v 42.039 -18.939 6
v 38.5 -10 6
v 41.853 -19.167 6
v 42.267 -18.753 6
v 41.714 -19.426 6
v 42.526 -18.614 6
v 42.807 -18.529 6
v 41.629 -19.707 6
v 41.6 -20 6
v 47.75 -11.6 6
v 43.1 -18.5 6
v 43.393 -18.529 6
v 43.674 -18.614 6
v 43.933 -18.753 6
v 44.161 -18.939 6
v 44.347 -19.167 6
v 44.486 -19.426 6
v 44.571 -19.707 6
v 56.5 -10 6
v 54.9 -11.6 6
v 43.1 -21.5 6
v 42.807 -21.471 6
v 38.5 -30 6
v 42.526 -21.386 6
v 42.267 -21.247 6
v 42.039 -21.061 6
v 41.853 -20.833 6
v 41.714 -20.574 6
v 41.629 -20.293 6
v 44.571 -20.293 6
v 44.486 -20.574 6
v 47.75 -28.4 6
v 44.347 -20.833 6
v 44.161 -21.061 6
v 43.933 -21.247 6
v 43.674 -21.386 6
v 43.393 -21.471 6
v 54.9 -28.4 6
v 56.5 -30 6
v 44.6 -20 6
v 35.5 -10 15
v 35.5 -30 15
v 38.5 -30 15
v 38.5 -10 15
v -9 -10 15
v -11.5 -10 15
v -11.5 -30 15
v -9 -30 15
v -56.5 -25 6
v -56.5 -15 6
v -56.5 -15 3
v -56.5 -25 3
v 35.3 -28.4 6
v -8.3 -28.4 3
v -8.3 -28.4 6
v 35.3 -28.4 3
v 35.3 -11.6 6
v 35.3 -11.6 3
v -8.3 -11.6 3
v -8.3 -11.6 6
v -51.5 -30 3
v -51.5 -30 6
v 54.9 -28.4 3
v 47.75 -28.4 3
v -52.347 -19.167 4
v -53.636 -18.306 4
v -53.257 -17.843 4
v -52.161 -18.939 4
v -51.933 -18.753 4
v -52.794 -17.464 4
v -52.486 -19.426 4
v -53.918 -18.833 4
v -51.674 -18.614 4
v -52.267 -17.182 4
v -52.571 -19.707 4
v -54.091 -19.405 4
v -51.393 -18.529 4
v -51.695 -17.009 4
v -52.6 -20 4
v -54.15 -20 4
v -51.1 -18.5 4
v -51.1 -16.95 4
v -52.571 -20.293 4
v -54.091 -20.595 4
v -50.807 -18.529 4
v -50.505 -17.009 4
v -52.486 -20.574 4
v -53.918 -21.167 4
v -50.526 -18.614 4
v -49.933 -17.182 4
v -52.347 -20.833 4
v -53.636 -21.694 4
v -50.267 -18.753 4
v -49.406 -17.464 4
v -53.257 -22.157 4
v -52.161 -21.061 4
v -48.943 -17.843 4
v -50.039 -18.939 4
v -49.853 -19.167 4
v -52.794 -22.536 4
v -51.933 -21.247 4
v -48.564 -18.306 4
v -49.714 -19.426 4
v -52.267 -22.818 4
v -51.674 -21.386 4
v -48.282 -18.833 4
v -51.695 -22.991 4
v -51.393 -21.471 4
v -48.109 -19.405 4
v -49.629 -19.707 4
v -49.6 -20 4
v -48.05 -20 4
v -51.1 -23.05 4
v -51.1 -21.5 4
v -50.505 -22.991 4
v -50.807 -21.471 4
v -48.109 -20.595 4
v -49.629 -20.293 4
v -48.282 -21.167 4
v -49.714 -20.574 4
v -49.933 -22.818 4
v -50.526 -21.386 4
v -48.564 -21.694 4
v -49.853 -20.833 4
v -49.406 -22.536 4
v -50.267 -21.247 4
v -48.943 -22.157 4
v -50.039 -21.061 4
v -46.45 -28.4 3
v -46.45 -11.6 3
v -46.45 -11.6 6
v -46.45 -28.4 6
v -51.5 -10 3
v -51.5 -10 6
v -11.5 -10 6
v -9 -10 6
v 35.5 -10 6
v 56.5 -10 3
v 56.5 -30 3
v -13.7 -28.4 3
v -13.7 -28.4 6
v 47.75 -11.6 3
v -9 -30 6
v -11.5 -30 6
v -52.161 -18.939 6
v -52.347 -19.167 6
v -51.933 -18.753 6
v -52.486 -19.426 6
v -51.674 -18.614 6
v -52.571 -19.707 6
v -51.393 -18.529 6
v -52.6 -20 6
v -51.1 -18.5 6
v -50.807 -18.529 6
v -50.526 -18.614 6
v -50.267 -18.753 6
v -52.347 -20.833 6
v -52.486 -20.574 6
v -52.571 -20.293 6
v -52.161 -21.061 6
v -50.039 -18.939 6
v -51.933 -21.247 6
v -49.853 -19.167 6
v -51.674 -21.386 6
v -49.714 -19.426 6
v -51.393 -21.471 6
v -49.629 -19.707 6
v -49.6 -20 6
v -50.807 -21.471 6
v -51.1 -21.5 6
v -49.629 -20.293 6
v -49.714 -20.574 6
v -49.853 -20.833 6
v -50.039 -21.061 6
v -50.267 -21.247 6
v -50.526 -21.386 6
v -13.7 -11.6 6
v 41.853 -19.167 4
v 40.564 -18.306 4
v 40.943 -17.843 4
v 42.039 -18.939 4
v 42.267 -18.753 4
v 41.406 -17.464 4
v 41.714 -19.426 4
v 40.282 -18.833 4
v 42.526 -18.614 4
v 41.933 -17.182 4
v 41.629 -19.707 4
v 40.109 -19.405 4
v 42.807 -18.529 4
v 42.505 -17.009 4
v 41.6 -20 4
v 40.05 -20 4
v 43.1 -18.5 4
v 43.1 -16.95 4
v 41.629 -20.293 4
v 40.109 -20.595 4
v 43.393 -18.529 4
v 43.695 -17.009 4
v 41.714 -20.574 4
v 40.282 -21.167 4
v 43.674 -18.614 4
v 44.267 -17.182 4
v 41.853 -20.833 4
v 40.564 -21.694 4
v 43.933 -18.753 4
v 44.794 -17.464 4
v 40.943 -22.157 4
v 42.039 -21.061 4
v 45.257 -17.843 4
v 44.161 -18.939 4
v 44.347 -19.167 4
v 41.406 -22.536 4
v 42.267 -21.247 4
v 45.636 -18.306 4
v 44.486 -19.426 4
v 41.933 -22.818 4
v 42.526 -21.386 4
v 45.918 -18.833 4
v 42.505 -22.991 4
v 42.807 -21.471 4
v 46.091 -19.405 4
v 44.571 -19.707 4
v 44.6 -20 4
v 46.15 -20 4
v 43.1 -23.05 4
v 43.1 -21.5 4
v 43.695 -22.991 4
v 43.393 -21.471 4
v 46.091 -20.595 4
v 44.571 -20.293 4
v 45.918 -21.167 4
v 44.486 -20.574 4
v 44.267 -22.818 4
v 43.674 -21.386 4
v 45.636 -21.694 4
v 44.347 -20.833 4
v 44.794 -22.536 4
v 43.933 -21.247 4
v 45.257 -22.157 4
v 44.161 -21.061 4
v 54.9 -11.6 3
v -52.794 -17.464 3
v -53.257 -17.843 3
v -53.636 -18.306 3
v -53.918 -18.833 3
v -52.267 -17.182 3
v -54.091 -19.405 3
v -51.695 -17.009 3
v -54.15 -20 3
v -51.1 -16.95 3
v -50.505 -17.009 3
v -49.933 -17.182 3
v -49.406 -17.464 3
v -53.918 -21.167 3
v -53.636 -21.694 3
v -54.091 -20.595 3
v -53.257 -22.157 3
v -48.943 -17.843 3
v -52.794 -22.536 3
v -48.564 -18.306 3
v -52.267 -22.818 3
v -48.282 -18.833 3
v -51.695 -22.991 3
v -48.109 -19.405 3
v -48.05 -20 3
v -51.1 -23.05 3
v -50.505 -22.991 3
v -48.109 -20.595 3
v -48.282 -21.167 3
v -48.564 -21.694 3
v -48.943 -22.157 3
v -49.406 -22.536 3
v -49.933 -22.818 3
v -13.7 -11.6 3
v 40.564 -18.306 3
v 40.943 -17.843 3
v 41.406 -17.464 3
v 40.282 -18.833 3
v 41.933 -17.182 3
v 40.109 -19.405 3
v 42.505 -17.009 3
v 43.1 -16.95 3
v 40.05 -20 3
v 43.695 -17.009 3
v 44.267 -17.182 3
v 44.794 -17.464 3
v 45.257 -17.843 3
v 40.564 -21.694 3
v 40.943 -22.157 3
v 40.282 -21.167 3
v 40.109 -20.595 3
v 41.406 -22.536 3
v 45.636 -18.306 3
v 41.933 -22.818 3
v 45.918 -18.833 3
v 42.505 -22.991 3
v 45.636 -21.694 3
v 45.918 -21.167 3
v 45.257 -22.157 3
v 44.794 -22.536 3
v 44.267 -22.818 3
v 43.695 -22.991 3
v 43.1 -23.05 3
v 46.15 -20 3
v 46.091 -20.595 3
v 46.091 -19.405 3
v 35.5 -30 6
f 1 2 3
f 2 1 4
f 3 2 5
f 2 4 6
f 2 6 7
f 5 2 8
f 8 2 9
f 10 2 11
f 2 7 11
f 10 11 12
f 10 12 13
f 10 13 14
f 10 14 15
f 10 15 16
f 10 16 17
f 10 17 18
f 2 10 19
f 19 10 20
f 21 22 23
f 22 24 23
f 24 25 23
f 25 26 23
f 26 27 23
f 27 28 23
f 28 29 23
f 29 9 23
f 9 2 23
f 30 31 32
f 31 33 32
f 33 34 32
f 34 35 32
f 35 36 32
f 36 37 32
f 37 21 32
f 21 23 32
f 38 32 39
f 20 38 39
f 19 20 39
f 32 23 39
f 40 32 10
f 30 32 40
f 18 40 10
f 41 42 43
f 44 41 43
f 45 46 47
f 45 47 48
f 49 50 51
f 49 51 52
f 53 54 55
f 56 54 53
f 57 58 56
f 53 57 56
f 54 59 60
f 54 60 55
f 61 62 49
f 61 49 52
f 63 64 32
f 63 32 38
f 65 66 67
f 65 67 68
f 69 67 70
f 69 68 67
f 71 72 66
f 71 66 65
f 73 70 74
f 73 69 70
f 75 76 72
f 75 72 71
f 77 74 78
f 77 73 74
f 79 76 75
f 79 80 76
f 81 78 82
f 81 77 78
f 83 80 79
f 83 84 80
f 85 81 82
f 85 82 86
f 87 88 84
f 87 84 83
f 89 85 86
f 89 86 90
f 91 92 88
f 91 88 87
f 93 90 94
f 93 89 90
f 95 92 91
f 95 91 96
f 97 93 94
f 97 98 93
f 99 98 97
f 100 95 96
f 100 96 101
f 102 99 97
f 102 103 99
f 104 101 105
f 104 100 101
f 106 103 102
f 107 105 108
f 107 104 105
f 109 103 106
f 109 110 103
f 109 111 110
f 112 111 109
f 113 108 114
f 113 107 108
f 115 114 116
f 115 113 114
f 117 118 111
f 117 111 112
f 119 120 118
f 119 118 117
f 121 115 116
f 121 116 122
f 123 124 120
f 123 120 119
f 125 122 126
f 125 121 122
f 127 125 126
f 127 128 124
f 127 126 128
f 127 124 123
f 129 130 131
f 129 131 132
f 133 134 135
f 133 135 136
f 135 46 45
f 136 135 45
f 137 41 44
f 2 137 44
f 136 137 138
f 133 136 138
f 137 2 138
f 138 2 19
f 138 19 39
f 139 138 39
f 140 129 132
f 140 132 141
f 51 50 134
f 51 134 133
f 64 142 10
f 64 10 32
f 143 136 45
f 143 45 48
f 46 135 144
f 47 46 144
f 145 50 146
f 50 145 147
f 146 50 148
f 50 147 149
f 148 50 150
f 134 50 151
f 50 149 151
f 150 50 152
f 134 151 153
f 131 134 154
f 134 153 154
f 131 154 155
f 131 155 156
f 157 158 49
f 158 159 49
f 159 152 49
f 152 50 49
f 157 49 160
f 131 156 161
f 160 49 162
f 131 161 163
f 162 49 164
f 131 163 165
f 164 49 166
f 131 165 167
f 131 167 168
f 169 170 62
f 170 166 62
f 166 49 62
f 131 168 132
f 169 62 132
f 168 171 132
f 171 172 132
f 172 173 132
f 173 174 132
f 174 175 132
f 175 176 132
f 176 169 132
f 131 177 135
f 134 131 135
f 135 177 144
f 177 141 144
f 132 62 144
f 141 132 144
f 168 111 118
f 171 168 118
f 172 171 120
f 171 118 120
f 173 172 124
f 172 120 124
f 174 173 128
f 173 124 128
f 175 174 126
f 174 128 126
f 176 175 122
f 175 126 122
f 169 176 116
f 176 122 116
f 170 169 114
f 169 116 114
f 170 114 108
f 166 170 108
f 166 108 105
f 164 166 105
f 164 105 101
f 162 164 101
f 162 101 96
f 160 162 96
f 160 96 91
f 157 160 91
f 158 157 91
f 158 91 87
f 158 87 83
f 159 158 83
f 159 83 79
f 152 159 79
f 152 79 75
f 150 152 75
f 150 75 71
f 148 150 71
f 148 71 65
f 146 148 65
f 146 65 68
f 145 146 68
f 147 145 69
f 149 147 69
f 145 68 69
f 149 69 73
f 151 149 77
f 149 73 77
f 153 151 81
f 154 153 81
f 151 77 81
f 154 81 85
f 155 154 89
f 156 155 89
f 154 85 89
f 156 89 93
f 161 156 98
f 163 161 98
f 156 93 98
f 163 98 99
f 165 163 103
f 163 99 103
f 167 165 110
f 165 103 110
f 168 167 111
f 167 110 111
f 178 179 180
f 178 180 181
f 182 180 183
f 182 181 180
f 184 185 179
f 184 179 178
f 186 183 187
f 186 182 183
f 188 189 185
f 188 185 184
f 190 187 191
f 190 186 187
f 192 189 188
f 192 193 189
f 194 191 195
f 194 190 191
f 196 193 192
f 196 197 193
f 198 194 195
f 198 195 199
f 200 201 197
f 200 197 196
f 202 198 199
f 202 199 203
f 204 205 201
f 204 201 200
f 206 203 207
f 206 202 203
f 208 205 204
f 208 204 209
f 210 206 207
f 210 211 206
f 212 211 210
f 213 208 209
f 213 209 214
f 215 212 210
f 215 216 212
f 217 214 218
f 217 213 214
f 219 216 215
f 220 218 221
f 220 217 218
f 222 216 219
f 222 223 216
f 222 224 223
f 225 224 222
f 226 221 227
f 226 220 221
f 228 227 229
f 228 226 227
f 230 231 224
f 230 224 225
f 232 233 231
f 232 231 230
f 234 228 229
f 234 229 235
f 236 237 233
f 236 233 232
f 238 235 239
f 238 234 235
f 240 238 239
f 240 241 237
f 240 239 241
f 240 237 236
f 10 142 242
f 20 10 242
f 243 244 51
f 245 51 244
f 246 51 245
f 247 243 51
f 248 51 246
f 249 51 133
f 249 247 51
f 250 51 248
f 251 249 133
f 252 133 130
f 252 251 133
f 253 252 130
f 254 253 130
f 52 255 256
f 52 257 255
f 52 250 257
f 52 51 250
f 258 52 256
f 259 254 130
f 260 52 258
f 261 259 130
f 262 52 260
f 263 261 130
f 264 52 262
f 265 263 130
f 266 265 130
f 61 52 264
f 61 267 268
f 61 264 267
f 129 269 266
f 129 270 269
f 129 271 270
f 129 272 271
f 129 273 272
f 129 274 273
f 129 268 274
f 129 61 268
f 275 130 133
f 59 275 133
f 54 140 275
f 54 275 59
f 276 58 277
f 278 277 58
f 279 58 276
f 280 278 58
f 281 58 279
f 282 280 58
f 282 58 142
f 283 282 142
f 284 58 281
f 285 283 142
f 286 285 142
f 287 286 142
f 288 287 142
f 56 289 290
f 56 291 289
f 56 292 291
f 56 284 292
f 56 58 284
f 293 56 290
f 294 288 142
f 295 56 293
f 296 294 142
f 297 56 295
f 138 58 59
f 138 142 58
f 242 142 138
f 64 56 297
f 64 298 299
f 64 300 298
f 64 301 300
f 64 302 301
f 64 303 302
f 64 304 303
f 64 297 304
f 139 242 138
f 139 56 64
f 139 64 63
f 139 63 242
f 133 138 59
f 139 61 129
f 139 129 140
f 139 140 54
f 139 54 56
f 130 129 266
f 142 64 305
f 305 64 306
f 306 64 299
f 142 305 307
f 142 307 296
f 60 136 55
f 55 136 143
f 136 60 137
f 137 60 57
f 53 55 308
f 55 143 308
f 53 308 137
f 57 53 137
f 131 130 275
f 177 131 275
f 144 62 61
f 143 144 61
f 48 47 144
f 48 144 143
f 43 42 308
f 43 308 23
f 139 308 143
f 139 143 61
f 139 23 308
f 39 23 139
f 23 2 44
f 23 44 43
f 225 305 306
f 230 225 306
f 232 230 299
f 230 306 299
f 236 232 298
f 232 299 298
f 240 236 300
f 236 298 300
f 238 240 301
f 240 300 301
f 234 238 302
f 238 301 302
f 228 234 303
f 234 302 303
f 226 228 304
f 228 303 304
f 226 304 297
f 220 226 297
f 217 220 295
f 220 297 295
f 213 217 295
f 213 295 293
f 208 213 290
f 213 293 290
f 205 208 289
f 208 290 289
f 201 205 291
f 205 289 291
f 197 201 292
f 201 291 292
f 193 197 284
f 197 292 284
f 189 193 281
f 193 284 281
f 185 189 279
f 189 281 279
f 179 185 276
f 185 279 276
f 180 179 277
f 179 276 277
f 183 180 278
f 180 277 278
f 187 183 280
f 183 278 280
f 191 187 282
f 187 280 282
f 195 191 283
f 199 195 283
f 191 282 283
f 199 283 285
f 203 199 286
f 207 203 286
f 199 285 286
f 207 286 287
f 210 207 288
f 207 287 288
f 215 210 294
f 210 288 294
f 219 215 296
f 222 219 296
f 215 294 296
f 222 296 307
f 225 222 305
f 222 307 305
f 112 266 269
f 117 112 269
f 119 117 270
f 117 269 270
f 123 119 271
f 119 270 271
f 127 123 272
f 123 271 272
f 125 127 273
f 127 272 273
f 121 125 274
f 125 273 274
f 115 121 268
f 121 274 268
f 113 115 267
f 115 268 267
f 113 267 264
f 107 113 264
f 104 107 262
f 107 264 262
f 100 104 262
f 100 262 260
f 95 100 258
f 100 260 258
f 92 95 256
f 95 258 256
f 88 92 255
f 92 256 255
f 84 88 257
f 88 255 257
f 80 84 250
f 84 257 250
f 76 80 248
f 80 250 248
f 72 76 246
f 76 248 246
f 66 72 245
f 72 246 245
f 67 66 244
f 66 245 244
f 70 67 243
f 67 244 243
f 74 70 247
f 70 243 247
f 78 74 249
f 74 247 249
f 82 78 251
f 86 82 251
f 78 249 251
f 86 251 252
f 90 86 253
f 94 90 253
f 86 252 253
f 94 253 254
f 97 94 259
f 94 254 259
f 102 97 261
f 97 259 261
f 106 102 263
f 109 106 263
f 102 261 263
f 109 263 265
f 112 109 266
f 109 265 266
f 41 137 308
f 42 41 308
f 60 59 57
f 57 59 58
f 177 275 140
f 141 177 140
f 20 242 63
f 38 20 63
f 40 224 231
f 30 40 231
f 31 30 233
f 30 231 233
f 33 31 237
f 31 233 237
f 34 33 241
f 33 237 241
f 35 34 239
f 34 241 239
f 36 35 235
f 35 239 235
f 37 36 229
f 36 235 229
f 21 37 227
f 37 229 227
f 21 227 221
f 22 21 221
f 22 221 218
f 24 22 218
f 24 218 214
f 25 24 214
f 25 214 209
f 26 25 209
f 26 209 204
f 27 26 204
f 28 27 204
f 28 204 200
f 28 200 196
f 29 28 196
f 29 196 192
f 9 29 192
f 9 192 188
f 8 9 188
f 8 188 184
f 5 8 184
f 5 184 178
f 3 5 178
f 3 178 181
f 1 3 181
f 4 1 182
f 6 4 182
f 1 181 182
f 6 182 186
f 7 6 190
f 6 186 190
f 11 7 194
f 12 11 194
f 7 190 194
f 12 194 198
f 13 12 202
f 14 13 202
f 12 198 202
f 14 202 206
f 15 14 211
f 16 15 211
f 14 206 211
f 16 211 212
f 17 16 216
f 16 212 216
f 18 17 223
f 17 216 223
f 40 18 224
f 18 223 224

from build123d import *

# Parameters (mm, degrees)
F0_W      = 113
F0_H      = 20
F1_DEPTH  = 3
F2_W      = 2.5
F2_H      = 20
F2_W_2    = 3
F3_DEPTH  = 12
F4_R      = 1.5
F5_DEPTH  = 3
F6_R      = 3.05
F6_R_2    = 1.5
F7_DEPTH  = 1
F8_W      = 32.75
F8_H      = 16.8
F8_W_2    = 43.6
F8_W_3    = 7.15
F9_DEPTH  = 3
F10_SIZE  = 5
F11_ANGLE = 180


# Not quite as in the source:
# - a feature of the source that left no trace in its solid (it failed there, or was rolled back) is left out


with BuildPart() as f1:
    # F0 (on Top) → F1 (new body)
    with BuildSketch(Plane.XY):
        Rectangle(F0_W, F0_H)
    extrude(amount=F1_DEPTH)

    # F2 (on face) → F3 (join)
    with BuildSketch(Plane.XY.offset(3)):
        with Locations((-10.25, 0)):
            Rectangle(F2_W, F2_H)
        with Locations((37, 0)):
            Rectangle(F2_W_2, F2_H)
    extrude(amount=-F3_DEPTH)

    # F4 (on face) → F5 (cut, through all)
    with BuildSketch(Plane.XY.offset(3)):
        with Locations((-51.1, 0)):
            Circle(F4_R)
        with Locations((43.1, 0)):
            Circle(F4_R)
    extrude(amount=-F5_DEPTH, mode=Mode.SUBTRACT)

    # F6 (on face) → F7 (cut)
    with BuildSketch(Plane.XY.offset(3)):
        with Locations((-51.1, 0)):
            Circle(F6_R)
        with Locations((-51.1, 0)):
            Circle(F6_R_2, mode=Mode.SUBTRACT)
        with Locations((43.1, 0)):
            Circle(F6_R)
        with Locations((43.1, 0)):
            Circle(F6_R_2, mode=Mode.SUBTRACT)
    extrude(amount=-F7_DEPTH, mode=Mode.SUBTRACT)

    # F8 (on face) → F9 (cut, through all)
    with BuildSketch(Plane.XY.offset(3)):
        with Locations((-30.075, 0)):
            Rectangle(F8_W, F8_H)
        with Locations((13.5, 0)):
            Rectangle(F8_W_2, F8_H)
        with Locations((51.325, 0)):
            Rectangle(F8_W_3, F8_H)
    extrude(amount=-F9_DEPTH, mode=Mode.SUBTRACT)

    # F10
    f10_edges = [f1.edges().sort_by_distance(p)[0] for p in [
        (-56.5, 10, 1.5),
        (-56.5, -10, 1.5),
    ]]
    chamfer(f10_edges, length=F10_SIZE)


with BuildPart() as f1_1:
    # F11: moved
    add(f1.part.rotate(Axis((2.5, -10, 3), (-1, 0, 0)), F11_ANGLE))


solid = f1_1.part
